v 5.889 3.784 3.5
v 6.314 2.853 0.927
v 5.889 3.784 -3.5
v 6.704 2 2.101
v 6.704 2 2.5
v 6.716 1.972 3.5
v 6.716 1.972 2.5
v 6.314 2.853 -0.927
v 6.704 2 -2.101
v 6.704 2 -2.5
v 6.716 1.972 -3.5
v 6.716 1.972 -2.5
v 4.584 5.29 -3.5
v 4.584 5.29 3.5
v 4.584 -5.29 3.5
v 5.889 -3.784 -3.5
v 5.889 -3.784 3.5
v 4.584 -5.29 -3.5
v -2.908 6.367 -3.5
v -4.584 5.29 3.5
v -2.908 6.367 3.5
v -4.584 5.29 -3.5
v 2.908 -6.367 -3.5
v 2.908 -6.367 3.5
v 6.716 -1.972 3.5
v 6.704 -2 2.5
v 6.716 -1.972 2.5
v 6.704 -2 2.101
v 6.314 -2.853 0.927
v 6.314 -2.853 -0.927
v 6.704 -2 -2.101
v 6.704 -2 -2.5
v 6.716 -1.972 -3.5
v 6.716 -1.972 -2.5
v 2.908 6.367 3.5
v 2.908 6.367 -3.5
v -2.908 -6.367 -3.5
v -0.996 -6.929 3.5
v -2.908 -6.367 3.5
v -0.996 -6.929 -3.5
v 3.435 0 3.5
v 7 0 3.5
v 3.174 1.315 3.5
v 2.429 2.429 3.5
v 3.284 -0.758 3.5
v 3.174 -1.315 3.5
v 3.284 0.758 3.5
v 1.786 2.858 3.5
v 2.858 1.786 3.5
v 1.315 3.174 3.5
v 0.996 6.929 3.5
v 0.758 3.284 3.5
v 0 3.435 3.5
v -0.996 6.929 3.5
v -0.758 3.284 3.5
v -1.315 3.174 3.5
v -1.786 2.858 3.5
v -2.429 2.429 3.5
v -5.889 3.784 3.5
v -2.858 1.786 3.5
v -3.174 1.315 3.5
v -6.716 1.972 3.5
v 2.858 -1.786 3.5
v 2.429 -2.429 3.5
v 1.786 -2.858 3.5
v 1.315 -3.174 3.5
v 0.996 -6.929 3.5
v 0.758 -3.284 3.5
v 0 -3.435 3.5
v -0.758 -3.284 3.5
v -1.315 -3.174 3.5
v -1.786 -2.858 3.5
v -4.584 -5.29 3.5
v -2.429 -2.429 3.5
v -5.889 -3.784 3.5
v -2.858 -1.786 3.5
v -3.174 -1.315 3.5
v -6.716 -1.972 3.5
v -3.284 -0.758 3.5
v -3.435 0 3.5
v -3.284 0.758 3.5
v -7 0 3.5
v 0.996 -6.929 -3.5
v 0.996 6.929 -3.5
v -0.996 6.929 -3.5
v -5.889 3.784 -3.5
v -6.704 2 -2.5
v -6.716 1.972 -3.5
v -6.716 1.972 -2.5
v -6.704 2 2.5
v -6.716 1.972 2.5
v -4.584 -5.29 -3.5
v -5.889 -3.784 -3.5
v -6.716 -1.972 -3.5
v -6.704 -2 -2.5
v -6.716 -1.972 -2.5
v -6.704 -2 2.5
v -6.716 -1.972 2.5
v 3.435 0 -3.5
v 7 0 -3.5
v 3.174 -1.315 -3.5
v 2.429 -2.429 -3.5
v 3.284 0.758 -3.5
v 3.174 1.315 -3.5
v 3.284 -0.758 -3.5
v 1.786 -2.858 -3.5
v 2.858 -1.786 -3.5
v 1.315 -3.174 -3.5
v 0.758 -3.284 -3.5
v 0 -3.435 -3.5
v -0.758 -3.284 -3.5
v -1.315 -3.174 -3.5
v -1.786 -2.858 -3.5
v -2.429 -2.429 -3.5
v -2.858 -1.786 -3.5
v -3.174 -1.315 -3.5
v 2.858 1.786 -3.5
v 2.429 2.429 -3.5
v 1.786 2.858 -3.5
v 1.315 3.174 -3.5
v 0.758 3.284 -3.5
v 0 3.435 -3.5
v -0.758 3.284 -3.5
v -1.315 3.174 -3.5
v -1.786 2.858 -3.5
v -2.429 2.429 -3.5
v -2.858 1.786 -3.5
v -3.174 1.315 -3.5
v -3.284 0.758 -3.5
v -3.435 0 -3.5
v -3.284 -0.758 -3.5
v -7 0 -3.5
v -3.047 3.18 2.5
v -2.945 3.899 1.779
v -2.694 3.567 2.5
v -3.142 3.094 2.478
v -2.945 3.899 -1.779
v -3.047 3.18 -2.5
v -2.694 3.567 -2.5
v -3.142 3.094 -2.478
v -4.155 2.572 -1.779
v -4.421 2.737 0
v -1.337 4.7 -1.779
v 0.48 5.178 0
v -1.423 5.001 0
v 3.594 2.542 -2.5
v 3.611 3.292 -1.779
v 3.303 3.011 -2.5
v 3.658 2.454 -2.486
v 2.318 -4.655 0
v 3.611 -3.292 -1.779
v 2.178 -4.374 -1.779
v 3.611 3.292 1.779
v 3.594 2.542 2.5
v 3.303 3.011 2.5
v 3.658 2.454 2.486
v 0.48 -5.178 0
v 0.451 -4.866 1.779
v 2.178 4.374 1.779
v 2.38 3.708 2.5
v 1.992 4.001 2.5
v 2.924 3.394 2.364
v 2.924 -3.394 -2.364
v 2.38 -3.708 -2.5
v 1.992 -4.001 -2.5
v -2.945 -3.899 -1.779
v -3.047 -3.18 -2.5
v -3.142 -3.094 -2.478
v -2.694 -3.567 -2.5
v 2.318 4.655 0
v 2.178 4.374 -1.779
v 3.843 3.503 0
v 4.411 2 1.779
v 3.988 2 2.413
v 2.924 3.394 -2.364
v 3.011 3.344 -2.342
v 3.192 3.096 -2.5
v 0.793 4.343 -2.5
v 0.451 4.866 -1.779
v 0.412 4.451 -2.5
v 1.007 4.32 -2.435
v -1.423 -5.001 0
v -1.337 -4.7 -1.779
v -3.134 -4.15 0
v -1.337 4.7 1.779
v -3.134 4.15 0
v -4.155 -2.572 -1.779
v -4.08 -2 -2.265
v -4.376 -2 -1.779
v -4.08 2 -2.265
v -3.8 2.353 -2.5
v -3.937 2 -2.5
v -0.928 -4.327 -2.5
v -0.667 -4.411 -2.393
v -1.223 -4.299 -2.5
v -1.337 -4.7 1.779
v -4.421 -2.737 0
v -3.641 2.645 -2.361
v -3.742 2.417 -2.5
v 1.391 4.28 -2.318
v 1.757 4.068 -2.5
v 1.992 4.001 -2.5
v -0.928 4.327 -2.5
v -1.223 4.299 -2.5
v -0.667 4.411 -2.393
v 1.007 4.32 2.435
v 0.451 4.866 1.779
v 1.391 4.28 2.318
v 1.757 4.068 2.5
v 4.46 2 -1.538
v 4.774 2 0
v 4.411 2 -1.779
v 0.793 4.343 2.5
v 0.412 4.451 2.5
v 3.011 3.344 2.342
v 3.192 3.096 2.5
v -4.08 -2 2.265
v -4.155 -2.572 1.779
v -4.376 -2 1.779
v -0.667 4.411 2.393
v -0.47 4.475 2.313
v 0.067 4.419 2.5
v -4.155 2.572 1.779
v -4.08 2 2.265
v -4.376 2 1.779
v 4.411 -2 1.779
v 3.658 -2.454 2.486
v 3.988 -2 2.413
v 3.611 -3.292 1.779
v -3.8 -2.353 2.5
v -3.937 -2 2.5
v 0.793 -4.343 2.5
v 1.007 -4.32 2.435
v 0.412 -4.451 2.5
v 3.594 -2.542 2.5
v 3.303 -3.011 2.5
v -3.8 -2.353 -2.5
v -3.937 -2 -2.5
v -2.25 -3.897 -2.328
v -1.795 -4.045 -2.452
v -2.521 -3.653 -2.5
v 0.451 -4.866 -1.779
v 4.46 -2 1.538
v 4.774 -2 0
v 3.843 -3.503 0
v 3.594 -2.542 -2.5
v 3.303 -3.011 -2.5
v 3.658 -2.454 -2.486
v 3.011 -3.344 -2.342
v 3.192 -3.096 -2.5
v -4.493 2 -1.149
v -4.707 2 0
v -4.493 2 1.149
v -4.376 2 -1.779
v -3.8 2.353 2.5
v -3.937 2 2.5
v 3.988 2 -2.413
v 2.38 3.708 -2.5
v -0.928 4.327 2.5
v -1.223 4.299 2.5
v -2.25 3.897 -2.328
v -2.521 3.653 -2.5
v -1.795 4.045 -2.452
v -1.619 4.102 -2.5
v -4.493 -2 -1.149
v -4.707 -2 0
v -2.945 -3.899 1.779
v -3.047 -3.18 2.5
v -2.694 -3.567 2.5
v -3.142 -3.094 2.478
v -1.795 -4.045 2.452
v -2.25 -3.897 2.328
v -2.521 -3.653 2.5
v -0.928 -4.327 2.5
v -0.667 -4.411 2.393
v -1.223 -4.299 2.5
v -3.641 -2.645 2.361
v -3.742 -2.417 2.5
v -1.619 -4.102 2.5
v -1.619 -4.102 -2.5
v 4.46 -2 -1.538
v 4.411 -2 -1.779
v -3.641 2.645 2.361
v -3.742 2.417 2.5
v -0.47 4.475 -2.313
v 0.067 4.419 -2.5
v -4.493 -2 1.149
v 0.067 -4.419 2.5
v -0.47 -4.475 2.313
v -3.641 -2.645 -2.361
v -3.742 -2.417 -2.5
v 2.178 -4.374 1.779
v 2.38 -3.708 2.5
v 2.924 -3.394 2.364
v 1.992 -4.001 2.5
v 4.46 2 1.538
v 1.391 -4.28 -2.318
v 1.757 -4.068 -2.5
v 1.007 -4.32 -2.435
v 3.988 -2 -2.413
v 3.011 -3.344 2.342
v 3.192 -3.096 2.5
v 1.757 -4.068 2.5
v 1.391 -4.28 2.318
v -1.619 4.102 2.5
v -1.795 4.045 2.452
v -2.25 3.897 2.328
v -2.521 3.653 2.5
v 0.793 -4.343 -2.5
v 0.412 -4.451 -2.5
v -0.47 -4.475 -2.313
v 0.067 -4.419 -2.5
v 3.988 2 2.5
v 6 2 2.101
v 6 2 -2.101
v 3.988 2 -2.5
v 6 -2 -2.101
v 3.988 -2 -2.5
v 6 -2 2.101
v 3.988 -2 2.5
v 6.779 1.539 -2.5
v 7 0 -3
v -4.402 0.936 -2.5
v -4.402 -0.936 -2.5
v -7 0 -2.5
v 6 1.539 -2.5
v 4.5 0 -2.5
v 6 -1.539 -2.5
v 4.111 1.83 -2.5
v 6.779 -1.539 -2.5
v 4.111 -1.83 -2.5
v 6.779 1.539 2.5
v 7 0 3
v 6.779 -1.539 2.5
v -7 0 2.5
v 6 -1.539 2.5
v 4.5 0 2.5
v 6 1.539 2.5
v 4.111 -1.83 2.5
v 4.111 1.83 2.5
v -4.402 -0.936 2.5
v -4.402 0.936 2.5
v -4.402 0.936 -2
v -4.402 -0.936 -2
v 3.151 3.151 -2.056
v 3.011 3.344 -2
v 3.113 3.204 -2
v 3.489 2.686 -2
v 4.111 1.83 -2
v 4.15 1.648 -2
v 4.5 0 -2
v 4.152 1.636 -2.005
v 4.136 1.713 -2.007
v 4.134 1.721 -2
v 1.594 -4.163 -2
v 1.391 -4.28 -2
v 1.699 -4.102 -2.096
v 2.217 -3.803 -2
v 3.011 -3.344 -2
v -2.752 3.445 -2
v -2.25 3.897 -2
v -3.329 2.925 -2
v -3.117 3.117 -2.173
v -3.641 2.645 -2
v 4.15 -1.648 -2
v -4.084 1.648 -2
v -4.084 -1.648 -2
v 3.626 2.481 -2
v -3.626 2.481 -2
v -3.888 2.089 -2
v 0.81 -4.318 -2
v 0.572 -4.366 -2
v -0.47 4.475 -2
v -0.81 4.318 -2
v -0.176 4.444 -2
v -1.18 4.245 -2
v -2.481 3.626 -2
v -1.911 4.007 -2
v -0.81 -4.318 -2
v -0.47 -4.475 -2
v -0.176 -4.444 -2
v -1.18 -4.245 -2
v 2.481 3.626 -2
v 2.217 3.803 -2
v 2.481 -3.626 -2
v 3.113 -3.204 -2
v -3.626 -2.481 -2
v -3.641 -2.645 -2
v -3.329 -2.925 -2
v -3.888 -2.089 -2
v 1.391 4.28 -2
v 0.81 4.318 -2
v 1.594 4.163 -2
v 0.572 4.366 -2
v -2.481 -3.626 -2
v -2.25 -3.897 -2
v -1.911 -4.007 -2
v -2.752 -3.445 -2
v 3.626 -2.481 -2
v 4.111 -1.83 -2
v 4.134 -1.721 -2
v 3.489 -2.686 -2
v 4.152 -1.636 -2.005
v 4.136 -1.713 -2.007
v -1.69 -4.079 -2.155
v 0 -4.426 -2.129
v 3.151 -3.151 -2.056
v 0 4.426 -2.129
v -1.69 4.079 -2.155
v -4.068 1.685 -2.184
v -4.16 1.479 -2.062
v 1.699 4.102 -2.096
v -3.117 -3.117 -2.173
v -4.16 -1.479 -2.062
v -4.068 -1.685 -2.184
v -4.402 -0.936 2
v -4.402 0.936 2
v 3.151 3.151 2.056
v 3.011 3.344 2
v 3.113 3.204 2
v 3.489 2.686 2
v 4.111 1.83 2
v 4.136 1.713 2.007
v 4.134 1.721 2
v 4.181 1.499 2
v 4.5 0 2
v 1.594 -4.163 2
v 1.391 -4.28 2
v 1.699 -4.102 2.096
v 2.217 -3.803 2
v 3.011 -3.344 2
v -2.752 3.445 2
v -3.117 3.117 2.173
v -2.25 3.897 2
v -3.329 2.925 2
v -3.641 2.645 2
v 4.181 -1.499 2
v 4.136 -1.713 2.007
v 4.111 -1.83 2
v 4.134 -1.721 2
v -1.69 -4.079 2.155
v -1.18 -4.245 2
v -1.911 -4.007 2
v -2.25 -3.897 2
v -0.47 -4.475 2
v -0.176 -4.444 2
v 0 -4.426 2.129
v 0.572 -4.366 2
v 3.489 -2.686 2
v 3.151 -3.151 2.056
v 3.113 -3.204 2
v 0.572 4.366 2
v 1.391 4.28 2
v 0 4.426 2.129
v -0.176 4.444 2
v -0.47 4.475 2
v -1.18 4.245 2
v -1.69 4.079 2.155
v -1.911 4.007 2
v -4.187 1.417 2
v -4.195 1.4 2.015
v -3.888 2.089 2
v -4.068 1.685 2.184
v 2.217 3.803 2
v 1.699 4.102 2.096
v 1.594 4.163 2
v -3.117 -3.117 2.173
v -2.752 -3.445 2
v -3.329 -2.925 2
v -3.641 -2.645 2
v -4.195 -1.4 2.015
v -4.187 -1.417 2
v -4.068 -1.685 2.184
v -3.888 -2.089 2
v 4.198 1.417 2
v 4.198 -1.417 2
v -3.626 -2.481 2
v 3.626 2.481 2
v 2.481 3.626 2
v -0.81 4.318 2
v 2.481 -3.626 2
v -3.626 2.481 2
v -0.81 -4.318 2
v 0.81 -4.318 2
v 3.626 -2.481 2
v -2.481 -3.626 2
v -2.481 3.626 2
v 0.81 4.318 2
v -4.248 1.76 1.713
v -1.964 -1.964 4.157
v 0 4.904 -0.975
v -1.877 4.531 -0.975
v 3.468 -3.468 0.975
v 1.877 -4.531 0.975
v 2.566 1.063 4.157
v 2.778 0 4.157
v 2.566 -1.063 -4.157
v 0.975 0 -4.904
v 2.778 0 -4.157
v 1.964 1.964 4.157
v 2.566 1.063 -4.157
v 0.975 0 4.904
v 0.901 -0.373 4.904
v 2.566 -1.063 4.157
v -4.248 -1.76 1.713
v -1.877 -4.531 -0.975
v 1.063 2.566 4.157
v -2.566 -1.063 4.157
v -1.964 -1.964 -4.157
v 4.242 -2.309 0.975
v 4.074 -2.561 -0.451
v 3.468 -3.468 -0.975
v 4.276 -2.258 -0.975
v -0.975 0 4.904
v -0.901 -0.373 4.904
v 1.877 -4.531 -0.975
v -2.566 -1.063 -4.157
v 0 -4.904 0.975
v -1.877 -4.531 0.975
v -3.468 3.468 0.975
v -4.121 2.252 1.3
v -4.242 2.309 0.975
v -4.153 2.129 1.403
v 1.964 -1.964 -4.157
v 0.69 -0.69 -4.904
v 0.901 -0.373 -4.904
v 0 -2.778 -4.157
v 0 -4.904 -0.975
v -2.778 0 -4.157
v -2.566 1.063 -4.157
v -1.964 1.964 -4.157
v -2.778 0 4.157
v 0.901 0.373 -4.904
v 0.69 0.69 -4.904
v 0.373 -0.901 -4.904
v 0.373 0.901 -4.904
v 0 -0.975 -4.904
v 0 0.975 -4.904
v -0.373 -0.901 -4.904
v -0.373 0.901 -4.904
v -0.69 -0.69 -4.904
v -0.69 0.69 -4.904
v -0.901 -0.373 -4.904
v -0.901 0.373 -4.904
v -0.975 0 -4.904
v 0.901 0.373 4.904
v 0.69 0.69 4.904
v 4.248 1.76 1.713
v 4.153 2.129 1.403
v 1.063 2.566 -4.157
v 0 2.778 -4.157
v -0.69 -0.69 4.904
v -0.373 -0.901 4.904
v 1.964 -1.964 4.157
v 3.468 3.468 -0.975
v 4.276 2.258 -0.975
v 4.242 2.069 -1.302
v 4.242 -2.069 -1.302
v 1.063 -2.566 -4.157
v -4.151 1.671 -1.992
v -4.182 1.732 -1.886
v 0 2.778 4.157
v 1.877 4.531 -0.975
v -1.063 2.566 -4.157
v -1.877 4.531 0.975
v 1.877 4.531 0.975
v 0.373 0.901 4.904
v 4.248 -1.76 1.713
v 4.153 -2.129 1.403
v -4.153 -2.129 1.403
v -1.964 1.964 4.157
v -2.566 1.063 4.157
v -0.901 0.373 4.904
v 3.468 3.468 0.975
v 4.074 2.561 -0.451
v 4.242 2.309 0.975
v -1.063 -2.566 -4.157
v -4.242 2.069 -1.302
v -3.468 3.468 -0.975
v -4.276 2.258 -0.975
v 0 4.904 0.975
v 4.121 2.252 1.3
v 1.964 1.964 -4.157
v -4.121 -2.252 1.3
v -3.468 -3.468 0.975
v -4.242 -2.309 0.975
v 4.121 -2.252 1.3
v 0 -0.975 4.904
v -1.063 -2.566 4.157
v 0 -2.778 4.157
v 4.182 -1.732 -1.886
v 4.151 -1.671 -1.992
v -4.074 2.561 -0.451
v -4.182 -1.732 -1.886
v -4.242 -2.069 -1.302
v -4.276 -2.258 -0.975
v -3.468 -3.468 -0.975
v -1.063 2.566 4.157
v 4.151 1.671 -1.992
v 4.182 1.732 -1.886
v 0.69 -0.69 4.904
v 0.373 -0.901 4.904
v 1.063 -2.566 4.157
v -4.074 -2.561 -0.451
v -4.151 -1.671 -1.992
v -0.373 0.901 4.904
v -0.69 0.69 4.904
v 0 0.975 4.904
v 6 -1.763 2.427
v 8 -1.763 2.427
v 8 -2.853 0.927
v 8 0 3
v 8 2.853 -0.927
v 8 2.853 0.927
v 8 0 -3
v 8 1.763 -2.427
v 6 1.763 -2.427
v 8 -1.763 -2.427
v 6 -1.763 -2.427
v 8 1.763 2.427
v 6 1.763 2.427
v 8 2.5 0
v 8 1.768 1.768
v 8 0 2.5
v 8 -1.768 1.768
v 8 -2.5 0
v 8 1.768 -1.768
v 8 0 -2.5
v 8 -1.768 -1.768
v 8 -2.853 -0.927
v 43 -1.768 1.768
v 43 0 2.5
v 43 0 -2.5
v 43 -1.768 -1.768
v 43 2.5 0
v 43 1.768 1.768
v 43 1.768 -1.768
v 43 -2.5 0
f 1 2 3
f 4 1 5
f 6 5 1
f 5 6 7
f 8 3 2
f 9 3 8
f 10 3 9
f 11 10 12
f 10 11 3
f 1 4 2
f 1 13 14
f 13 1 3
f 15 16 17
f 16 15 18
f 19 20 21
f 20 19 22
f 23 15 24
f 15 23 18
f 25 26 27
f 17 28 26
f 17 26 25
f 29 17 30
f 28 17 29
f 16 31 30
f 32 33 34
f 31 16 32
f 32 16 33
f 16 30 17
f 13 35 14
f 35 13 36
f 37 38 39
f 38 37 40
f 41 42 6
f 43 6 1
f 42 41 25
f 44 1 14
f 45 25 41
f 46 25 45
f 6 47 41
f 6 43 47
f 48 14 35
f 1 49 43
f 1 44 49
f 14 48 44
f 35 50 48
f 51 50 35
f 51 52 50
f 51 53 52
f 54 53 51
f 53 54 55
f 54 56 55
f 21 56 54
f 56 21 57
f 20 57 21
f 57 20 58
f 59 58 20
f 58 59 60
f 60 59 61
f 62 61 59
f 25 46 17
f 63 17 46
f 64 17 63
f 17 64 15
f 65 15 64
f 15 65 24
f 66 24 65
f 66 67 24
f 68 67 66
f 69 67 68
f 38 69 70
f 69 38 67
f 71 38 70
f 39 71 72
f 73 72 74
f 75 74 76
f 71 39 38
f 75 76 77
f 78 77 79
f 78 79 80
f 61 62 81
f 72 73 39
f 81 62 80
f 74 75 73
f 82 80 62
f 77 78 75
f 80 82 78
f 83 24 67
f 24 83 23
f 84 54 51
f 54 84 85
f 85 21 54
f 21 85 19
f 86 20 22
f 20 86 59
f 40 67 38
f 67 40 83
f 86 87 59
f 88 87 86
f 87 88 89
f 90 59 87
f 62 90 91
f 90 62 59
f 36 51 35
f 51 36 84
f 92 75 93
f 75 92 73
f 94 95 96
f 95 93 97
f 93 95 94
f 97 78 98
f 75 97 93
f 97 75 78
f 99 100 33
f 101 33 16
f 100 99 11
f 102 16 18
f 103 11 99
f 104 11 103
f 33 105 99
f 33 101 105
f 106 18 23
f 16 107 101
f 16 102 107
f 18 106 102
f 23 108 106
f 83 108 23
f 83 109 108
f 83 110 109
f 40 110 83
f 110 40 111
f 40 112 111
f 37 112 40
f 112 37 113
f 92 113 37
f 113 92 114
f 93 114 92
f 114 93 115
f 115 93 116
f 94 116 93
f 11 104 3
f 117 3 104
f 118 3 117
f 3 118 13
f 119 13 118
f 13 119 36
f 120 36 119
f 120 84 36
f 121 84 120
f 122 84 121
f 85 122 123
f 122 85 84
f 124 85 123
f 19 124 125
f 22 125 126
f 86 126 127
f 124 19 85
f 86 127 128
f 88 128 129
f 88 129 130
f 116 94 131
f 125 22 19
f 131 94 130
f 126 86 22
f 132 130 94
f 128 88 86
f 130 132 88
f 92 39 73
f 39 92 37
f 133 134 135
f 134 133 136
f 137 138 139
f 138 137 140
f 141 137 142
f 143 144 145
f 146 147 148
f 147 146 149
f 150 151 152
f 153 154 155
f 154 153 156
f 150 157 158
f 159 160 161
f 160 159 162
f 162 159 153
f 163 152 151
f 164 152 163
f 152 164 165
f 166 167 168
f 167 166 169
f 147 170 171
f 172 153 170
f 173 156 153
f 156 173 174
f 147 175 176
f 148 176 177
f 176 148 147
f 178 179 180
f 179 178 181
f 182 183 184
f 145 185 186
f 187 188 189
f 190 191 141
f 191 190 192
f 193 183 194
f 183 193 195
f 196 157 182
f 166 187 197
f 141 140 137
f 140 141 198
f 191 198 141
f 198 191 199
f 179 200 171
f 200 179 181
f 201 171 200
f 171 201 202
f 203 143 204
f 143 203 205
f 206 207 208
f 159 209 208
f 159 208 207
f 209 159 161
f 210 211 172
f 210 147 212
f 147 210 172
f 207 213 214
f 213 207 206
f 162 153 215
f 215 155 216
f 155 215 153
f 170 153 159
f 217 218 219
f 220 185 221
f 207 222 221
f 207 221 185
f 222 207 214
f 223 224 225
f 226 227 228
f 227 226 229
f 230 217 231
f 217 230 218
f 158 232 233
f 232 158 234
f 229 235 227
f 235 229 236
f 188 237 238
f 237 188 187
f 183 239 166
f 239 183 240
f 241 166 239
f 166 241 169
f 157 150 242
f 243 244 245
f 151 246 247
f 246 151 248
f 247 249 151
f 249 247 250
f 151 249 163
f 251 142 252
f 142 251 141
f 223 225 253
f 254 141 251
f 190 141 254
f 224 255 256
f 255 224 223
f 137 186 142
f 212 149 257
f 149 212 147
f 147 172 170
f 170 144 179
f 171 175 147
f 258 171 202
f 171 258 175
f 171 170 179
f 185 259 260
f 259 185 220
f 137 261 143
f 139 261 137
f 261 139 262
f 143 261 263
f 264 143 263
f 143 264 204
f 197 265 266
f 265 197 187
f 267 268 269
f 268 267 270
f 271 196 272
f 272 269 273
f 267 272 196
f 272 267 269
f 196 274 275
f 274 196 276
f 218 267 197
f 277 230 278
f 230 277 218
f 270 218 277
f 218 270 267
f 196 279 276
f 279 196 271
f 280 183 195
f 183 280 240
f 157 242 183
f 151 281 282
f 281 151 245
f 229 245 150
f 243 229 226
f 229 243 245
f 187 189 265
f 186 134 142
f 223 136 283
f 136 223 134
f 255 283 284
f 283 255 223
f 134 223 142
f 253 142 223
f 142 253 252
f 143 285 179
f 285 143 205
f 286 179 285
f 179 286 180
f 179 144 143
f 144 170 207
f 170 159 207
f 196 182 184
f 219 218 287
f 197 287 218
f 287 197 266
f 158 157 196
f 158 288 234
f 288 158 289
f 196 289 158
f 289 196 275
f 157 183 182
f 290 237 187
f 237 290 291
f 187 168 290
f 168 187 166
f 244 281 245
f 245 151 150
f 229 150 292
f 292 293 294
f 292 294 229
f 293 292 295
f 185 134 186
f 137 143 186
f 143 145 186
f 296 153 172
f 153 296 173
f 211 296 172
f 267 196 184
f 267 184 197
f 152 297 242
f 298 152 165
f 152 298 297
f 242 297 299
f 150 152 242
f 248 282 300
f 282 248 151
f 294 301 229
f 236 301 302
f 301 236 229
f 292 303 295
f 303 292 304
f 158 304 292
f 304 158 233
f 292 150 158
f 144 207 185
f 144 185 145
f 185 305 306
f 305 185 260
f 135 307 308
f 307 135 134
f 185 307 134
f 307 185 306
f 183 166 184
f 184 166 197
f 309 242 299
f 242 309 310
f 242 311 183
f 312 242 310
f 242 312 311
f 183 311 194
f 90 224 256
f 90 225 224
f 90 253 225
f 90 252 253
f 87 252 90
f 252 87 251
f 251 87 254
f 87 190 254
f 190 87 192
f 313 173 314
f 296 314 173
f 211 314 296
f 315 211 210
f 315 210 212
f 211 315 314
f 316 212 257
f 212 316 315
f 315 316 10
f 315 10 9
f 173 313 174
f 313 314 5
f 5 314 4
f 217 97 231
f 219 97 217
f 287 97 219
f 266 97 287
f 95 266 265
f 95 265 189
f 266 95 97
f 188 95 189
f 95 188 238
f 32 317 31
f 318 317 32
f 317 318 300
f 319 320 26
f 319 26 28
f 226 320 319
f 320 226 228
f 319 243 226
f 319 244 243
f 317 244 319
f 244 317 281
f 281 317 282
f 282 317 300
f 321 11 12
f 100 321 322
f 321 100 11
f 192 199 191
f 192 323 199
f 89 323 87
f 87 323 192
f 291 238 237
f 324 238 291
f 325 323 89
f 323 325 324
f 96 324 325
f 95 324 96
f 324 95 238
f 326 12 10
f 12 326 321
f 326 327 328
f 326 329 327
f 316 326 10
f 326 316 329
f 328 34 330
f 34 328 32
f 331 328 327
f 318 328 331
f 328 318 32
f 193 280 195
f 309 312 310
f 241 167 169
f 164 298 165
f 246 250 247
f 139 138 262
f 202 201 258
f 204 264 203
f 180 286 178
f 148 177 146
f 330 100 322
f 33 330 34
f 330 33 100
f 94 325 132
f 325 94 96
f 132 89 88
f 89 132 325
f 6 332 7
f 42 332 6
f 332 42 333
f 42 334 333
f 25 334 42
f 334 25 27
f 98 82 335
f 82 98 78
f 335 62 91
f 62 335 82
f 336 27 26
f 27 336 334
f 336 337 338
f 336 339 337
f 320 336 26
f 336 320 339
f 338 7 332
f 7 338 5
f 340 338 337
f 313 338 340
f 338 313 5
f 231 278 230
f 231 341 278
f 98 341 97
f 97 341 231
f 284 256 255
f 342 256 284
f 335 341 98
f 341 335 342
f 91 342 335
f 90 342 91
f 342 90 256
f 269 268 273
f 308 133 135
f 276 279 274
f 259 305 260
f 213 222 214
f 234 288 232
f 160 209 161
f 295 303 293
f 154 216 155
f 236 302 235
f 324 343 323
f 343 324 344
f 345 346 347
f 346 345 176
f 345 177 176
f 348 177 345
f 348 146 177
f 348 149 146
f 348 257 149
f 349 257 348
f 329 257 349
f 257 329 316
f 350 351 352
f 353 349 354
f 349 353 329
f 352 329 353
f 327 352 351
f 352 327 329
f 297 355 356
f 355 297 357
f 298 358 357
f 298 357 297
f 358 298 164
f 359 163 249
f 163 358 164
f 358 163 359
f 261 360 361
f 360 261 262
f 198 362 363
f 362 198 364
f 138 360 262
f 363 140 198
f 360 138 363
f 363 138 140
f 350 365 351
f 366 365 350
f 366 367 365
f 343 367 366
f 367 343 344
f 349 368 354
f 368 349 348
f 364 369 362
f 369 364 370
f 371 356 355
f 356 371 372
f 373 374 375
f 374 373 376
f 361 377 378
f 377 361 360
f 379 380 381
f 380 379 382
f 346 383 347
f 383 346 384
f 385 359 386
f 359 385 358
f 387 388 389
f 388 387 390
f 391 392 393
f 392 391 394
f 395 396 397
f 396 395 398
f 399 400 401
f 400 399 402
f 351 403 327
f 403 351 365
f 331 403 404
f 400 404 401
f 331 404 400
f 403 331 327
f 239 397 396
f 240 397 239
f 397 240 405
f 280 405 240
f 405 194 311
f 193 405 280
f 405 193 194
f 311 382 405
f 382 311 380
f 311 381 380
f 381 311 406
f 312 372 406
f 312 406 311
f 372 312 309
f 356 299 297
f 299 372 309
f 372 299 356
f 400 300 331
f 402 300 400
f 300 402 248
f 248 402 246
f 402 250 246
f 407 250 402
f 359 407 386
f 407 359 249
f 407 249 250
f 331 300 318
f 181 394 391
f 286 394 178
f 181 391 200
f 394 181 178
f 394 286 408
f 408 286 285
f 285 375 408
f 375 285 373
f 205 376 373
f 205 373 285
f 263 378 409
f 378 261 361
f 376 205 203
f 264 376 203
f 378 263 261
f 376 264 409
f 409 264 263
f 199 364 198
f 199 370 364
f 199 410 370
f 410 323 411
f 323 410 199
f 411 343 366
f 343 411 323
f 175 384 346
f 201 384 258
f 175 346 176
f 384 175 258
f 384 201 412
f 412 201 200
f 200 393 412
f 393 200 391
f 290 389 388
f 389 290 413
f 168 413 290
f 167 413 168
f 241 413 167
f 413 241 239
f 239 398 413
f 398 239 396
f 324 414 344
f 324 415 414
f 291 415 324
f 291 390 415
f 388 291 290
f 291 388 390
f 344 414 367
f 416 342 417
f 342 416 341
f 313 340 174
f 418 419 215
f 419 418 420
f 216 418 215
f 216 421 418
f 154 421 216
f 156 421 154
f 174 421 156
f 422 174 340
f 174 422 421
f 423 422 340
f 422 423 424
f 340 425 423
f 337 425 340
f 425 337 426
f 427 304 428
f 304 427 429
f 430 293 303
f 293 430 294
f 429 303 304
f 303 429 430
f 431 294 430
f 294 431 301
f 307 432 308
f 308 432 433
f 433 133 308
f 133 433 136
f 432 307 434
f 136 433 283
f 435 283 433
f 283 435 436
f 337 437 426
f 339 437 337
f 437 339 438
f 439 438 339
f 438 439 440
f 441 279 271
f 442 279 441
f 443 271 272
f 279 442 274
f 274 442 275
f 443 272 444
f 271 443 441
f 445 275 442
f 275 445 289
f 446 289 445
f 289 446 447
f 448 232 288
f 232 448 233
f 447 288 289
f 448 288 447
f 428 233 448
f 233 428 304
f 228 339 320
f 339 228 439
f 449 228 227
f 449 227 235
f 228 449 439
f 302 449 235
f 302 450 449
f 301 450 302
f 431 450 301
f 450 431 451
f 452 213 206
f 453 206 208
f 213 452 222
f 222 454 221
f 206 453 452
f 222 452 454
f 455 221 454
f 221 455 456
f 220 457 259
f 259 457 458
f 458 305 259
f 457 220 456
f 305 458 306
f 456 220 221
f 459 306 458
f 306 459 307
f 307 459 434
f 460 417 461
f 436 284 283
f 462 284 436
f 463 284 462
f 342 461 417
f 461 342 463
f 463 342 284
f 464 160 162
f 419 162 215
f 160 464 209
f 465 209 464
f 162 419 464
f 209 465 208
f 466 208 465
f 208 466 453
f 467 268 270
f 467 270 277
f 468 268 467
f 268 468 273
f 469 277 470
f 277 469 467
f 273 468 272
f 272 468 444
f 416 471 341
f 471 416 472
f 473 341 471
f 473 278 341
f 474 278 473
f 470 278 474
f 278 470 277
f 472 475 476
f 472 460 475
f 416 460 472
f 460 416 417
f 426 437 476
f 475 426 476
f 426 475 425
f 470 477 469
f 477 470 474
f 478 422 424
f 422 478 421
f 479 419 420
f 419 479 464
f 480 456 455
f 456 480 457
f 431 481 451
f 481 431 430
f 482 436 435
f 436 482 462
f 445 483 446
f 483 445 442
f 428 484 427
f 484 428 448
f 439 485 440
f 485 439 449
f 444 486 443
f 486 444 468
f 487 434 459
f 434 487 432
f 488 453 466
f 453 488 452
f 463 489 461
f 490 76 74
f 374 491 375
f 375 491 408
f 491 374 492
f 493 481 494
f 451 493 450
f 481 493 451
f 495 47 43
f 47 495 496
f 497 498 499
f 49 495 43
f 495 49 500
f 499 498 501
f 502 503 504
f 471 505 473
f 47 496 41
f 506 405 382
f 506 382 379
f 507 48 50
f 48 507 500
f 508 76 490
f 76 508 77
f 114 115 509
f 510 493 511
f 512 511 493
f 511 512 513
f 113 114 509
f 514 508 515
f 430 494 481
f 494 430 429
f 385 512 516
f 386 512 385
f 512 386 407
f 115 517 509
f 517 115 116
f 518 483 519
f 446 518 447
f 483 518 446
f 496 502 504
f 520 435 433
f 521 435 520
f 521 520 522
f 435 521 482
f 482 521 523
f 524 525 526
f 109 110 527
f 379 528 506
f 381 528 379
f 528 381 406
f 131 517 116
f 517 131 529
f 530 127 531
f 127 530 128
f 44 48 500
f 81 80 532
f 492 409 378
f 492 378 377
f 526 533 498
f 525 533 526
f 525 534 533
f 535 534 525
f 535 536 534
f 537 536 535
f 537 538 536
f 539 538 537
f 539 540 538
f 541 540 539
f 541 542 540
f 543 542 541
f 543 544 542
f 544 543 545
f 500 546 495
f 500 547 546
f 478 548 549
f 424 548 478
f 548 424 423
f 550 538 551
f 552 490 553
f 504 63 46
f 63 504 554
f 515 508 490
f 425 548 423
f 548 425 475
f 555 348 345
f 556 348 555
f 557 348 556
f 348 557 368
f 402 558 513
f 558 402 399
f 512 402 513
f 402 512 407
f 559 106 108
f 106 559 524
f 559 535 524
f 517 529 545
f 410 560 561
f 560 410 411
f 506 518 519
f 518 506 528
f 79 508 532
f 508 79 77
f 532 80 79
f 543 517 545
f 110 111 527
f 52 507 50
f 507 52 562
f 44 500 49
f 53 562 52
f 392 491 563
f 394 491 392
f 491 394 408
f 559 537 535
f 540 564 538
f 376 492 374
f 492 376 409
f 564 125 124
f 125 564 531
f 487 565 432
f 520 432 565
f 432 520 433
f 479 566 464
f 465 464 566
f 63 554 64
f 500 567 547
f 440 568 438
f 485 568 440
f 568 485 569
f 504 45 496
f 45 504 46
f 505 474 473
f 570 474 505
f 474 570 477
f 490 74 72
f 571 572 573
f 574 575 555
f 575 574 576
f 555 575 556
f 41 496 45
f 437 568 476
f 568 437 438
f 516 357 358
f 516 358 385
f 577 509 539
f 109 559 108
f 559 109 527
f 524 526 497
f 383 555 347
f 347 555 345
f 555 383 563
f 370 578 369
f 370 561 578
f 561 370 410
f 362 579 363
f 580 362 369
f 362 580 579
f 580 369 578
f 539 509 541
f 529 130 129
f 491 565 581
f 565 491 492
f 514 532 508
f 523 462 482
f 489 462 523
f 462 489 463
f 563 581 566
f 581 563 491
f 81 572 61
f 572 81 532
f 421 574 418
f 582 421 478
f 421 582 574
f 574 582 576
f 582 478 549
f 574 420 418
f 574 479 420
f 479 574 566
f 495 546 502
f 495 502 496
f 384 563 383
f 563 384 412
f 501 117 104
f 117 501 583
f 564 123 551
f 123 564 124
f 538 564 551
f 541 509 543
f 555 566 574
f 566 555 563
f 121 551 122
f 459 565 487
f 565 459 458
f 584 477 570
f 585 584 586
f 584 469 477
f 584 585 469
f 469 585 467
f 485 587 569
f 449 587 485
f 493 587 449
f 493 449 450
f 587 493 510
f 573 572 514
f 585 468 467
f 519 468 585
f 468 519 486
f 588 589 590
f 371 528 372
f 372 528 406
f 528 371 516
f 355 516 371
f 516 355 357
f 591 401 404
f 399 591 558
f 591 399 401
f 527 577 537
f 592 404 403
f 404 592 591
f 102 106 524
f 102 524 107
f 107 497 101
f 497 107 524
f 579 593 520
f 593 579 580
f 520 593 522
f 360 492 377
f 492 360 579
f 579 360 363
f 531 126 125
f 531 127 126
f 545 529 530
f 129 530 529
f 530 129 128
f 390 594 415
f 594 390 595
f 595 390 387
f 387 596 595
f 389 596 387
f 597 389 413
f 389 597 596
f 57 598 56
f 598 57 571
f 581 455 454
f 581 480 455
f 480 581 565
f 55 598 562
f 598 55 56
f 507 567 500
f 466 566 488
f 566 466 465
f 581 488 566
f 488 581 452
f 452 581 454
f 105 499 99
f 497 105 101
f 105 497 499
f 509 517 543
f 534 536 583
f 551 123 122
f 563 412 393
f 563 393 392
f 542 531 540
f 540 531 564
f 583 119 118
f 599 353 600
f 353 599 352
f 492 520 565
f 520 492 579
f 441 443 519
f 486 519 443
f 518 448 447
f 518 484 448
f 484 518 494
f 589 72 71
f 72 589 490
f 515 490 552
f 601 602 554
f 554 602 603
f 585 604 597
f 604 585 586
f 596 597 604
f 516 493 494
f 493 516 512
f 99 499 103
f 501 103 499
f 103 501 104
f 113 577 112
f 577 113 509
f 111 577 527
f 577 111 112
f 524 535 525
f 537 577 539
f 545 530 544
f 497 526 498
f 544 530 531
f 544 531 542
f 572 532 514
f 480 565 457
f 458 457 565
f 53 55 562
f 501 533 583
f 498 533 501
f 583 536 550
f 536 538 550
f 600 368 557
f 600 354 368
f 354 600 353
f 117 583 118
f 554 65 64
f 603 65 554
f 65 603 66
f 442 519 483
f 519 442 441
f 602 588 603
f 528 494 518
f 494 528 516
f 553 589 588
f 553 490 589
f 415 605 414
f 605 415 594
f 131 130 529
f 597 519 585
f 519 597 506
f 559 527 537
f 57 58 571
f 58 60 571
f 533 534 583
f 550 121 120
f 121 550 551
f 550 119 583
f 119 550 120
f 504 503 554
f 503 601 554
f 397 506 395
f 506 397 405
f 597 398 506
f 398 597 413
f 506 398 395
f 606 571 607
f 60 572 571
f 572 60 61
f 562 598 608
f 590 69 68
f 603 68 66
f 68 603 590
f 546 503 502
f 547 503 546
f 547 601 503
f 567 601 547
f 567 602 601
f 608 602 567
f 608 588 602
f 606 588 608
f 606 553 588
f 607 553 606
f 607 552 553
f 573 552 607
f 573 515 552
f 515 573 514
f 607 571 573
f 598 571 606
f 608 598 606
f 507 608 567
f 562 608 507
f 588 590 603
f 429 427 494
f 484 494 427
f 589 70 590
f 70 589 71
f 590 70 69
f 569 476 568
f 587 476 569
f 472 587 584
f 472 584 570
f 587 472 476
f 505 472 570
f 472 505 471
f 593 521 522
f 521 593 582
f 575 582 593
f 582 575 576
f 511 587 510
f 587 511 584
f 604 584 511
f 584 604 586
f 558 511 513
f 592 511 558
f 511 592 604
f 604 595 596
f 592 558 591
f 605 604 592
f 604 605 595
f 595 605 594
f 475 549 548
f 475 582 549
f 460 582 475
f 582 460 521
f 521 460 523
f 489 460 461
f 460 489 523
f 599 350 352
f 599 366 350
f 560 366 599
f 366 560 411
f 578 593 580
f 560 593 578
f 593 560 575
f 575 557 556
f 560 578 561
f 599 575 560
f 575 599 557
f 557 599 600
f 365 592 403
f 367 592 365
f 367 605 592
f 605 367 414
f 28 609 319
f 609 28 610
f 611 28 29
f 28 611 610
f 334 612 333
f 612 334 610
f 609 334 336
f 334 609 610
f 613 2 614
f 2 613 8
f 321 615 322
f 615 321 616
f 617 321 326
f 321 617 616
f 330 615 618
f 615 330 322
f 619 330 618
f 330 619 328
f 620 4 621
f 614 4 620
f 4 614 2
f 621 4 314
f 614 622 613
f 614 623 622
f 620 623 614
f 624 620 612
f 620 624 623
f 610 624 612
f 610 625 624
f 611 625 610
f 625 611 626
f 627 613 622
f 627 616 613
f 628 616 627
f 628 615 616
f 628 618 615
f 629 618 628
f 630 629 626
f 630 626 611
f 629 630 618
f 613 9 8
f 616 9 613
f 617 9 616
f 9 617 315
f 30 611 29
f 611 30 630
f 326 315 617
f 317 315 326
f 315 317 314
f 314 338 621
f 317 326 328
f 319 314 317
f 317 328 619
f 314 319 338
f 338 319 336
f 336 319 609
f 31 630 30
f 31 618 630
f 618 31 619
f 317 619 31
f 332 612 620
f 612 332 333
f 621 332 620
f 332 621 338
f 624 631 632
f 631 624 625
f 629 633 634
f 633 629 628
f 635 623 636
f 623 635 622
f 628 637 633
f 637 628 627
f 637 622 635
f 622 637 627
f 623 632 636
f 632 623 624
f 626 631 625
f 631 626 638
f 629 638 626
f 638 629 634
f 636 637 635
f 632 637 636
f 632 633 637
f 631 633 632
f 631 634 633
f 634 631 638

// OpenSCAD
// Parameters
thread_d_major_mm = 5; //[2.5:10:0.1]
thread_pitch_mm = 0.8; //[0.4:1.6:0.05]
thread_length_mm = 12; //[6:24:0.5]
shank_length_mm = 35; //[18:70:1]
shank_diameter_mm = 5; //[2.5:10:0.1]
shoulder_diameter_mm = 6; //[3:12:0.1]
shoulder_length_mm = 2; //[1:6:0.1]
eye_outer_diameter_mm = 14; //[7:28:0.5]
eye_width_mm = 7; //[3.5:14:0.25]
ball_outer_diameter_mm = 10; //[5:20:0.5]
bore_diameter_mm = 5.2; //[2.6:10.4:0.1]
eye_rim_thickness_mm = 1; //[0.5:2:0.1]
ball_slot_width_mm = 4; //[2:8:0.25]
chamfer_mm = 0.5; //[0.2:1.5:0.1]
overlap_mm = 1; //[0.5:2:0.1]
eps_mm = 0.2; //[0.05:0.5:0.05]

// Rod End Bearing - complete geometry
module rod_end_bearing() {
  // Eye body with cavity and slot
  color("DimGray") {
    union() {
      difference() {
        cylinder(r=eye_outer_diameter_mm/2, h=eye_width_mm, center=true);
        sphere(r=ball_outer_diameter_mm/2 + eps_mm);
        cube([eye_outer_diameter_mm + 2*eps_mm, ball_slot_width_mm, eye_width_mm + 2*eps_mm], center=true);
      }

      // Eye side rims
      translate([0, 0, -eye_width_mm/2 + eye_rim_thickness_mm/2])
        cylinder(r=eye_outer_diameter_mm/2, h=eye_rim_thickness_mm, center=true);
      translate([0, 0,  eye_width_mm/2 - eye_rim_thickness_mm/2])
        cylinder(r=eye_outer_diameter_mm/2, h=eye_rim_thickness_mm, center=true);

      // Ball retention lips
      translate([0, 0, -eye_width_mm/2 + eye_rim_thickness_mm/2 + overlap_mm/2])
        cylinder(r=ball_outer_diameter_mm/2 - chamfer_mm, h=eye_rim_thickness_mm, center=true);
      translate([0, 0,  eye_width_mm/2 - eye_rim_thickness_mm/2 - overlap_mm/2])
        cylinder(r=ball_outer_diameter_mm/2 - chamfer_mm, h=eye_rim_thickness_mm, center=true);
    }
  }

  // Spherical ball with through bore
  color("Silver") {
    difference() {
      sphere(r=ball_outer_diameter_mm/2);
      rotate([0, 90, 0])
        cylinder(r=bore_diameter_mm/2, h=eye_outer_diameter_mm + 2*eps_mm, center=true);
    }
  }
}

// Rod - complete geometry (built so its LEFT END is at x=0, extending +X)
module rod() {
  color("Black") {
    union() {
      // Shoulder (adjacent to eye)
      translate([shoulder_length_mm/2, 0, 0])
        rotate([0, 90, 0])
          cylinder(r=shoulder_diameter_mm/2, h=shoulder_length_mm, center=true);

      // Unthreaded shank (after shoulder)
      translate([shoulder_length_mm + (shank_length_mm - thread_length_mm)/2, 0, 0])
        rotate([0, 90, 0])
          cylinder(r=shank_diameter_mm/2, h=shank_length_mm - thread_length_mm, center=true);

      // Threaded portion at the far end
      translate([shoulder_length_mm + (shank_length_mm - thread_length_mm) + thread_length_mm/2, 0, 0])
        rotate([0, 90, 0])
          cylinder(r=thread_d_major_mm/2, h=thread_length_mm, center=true);
    }
  }
}

// Assembly (single connected solid; rod overlaps eye by overlap_mm)
module assembly() {
  union() {
    rod_end_bearing();

    // Attach rod to the RIGHT side of the eye:
    // Eye extends to +eye_outer_diameter_mm/2 in X.
    // Place rod so its left end is inside the eye by overlap_mm.
    translate([eye_outer_diameter_mm/2 - overlap_mm, 0, 0])
      rod();
  }
}

assembly();
